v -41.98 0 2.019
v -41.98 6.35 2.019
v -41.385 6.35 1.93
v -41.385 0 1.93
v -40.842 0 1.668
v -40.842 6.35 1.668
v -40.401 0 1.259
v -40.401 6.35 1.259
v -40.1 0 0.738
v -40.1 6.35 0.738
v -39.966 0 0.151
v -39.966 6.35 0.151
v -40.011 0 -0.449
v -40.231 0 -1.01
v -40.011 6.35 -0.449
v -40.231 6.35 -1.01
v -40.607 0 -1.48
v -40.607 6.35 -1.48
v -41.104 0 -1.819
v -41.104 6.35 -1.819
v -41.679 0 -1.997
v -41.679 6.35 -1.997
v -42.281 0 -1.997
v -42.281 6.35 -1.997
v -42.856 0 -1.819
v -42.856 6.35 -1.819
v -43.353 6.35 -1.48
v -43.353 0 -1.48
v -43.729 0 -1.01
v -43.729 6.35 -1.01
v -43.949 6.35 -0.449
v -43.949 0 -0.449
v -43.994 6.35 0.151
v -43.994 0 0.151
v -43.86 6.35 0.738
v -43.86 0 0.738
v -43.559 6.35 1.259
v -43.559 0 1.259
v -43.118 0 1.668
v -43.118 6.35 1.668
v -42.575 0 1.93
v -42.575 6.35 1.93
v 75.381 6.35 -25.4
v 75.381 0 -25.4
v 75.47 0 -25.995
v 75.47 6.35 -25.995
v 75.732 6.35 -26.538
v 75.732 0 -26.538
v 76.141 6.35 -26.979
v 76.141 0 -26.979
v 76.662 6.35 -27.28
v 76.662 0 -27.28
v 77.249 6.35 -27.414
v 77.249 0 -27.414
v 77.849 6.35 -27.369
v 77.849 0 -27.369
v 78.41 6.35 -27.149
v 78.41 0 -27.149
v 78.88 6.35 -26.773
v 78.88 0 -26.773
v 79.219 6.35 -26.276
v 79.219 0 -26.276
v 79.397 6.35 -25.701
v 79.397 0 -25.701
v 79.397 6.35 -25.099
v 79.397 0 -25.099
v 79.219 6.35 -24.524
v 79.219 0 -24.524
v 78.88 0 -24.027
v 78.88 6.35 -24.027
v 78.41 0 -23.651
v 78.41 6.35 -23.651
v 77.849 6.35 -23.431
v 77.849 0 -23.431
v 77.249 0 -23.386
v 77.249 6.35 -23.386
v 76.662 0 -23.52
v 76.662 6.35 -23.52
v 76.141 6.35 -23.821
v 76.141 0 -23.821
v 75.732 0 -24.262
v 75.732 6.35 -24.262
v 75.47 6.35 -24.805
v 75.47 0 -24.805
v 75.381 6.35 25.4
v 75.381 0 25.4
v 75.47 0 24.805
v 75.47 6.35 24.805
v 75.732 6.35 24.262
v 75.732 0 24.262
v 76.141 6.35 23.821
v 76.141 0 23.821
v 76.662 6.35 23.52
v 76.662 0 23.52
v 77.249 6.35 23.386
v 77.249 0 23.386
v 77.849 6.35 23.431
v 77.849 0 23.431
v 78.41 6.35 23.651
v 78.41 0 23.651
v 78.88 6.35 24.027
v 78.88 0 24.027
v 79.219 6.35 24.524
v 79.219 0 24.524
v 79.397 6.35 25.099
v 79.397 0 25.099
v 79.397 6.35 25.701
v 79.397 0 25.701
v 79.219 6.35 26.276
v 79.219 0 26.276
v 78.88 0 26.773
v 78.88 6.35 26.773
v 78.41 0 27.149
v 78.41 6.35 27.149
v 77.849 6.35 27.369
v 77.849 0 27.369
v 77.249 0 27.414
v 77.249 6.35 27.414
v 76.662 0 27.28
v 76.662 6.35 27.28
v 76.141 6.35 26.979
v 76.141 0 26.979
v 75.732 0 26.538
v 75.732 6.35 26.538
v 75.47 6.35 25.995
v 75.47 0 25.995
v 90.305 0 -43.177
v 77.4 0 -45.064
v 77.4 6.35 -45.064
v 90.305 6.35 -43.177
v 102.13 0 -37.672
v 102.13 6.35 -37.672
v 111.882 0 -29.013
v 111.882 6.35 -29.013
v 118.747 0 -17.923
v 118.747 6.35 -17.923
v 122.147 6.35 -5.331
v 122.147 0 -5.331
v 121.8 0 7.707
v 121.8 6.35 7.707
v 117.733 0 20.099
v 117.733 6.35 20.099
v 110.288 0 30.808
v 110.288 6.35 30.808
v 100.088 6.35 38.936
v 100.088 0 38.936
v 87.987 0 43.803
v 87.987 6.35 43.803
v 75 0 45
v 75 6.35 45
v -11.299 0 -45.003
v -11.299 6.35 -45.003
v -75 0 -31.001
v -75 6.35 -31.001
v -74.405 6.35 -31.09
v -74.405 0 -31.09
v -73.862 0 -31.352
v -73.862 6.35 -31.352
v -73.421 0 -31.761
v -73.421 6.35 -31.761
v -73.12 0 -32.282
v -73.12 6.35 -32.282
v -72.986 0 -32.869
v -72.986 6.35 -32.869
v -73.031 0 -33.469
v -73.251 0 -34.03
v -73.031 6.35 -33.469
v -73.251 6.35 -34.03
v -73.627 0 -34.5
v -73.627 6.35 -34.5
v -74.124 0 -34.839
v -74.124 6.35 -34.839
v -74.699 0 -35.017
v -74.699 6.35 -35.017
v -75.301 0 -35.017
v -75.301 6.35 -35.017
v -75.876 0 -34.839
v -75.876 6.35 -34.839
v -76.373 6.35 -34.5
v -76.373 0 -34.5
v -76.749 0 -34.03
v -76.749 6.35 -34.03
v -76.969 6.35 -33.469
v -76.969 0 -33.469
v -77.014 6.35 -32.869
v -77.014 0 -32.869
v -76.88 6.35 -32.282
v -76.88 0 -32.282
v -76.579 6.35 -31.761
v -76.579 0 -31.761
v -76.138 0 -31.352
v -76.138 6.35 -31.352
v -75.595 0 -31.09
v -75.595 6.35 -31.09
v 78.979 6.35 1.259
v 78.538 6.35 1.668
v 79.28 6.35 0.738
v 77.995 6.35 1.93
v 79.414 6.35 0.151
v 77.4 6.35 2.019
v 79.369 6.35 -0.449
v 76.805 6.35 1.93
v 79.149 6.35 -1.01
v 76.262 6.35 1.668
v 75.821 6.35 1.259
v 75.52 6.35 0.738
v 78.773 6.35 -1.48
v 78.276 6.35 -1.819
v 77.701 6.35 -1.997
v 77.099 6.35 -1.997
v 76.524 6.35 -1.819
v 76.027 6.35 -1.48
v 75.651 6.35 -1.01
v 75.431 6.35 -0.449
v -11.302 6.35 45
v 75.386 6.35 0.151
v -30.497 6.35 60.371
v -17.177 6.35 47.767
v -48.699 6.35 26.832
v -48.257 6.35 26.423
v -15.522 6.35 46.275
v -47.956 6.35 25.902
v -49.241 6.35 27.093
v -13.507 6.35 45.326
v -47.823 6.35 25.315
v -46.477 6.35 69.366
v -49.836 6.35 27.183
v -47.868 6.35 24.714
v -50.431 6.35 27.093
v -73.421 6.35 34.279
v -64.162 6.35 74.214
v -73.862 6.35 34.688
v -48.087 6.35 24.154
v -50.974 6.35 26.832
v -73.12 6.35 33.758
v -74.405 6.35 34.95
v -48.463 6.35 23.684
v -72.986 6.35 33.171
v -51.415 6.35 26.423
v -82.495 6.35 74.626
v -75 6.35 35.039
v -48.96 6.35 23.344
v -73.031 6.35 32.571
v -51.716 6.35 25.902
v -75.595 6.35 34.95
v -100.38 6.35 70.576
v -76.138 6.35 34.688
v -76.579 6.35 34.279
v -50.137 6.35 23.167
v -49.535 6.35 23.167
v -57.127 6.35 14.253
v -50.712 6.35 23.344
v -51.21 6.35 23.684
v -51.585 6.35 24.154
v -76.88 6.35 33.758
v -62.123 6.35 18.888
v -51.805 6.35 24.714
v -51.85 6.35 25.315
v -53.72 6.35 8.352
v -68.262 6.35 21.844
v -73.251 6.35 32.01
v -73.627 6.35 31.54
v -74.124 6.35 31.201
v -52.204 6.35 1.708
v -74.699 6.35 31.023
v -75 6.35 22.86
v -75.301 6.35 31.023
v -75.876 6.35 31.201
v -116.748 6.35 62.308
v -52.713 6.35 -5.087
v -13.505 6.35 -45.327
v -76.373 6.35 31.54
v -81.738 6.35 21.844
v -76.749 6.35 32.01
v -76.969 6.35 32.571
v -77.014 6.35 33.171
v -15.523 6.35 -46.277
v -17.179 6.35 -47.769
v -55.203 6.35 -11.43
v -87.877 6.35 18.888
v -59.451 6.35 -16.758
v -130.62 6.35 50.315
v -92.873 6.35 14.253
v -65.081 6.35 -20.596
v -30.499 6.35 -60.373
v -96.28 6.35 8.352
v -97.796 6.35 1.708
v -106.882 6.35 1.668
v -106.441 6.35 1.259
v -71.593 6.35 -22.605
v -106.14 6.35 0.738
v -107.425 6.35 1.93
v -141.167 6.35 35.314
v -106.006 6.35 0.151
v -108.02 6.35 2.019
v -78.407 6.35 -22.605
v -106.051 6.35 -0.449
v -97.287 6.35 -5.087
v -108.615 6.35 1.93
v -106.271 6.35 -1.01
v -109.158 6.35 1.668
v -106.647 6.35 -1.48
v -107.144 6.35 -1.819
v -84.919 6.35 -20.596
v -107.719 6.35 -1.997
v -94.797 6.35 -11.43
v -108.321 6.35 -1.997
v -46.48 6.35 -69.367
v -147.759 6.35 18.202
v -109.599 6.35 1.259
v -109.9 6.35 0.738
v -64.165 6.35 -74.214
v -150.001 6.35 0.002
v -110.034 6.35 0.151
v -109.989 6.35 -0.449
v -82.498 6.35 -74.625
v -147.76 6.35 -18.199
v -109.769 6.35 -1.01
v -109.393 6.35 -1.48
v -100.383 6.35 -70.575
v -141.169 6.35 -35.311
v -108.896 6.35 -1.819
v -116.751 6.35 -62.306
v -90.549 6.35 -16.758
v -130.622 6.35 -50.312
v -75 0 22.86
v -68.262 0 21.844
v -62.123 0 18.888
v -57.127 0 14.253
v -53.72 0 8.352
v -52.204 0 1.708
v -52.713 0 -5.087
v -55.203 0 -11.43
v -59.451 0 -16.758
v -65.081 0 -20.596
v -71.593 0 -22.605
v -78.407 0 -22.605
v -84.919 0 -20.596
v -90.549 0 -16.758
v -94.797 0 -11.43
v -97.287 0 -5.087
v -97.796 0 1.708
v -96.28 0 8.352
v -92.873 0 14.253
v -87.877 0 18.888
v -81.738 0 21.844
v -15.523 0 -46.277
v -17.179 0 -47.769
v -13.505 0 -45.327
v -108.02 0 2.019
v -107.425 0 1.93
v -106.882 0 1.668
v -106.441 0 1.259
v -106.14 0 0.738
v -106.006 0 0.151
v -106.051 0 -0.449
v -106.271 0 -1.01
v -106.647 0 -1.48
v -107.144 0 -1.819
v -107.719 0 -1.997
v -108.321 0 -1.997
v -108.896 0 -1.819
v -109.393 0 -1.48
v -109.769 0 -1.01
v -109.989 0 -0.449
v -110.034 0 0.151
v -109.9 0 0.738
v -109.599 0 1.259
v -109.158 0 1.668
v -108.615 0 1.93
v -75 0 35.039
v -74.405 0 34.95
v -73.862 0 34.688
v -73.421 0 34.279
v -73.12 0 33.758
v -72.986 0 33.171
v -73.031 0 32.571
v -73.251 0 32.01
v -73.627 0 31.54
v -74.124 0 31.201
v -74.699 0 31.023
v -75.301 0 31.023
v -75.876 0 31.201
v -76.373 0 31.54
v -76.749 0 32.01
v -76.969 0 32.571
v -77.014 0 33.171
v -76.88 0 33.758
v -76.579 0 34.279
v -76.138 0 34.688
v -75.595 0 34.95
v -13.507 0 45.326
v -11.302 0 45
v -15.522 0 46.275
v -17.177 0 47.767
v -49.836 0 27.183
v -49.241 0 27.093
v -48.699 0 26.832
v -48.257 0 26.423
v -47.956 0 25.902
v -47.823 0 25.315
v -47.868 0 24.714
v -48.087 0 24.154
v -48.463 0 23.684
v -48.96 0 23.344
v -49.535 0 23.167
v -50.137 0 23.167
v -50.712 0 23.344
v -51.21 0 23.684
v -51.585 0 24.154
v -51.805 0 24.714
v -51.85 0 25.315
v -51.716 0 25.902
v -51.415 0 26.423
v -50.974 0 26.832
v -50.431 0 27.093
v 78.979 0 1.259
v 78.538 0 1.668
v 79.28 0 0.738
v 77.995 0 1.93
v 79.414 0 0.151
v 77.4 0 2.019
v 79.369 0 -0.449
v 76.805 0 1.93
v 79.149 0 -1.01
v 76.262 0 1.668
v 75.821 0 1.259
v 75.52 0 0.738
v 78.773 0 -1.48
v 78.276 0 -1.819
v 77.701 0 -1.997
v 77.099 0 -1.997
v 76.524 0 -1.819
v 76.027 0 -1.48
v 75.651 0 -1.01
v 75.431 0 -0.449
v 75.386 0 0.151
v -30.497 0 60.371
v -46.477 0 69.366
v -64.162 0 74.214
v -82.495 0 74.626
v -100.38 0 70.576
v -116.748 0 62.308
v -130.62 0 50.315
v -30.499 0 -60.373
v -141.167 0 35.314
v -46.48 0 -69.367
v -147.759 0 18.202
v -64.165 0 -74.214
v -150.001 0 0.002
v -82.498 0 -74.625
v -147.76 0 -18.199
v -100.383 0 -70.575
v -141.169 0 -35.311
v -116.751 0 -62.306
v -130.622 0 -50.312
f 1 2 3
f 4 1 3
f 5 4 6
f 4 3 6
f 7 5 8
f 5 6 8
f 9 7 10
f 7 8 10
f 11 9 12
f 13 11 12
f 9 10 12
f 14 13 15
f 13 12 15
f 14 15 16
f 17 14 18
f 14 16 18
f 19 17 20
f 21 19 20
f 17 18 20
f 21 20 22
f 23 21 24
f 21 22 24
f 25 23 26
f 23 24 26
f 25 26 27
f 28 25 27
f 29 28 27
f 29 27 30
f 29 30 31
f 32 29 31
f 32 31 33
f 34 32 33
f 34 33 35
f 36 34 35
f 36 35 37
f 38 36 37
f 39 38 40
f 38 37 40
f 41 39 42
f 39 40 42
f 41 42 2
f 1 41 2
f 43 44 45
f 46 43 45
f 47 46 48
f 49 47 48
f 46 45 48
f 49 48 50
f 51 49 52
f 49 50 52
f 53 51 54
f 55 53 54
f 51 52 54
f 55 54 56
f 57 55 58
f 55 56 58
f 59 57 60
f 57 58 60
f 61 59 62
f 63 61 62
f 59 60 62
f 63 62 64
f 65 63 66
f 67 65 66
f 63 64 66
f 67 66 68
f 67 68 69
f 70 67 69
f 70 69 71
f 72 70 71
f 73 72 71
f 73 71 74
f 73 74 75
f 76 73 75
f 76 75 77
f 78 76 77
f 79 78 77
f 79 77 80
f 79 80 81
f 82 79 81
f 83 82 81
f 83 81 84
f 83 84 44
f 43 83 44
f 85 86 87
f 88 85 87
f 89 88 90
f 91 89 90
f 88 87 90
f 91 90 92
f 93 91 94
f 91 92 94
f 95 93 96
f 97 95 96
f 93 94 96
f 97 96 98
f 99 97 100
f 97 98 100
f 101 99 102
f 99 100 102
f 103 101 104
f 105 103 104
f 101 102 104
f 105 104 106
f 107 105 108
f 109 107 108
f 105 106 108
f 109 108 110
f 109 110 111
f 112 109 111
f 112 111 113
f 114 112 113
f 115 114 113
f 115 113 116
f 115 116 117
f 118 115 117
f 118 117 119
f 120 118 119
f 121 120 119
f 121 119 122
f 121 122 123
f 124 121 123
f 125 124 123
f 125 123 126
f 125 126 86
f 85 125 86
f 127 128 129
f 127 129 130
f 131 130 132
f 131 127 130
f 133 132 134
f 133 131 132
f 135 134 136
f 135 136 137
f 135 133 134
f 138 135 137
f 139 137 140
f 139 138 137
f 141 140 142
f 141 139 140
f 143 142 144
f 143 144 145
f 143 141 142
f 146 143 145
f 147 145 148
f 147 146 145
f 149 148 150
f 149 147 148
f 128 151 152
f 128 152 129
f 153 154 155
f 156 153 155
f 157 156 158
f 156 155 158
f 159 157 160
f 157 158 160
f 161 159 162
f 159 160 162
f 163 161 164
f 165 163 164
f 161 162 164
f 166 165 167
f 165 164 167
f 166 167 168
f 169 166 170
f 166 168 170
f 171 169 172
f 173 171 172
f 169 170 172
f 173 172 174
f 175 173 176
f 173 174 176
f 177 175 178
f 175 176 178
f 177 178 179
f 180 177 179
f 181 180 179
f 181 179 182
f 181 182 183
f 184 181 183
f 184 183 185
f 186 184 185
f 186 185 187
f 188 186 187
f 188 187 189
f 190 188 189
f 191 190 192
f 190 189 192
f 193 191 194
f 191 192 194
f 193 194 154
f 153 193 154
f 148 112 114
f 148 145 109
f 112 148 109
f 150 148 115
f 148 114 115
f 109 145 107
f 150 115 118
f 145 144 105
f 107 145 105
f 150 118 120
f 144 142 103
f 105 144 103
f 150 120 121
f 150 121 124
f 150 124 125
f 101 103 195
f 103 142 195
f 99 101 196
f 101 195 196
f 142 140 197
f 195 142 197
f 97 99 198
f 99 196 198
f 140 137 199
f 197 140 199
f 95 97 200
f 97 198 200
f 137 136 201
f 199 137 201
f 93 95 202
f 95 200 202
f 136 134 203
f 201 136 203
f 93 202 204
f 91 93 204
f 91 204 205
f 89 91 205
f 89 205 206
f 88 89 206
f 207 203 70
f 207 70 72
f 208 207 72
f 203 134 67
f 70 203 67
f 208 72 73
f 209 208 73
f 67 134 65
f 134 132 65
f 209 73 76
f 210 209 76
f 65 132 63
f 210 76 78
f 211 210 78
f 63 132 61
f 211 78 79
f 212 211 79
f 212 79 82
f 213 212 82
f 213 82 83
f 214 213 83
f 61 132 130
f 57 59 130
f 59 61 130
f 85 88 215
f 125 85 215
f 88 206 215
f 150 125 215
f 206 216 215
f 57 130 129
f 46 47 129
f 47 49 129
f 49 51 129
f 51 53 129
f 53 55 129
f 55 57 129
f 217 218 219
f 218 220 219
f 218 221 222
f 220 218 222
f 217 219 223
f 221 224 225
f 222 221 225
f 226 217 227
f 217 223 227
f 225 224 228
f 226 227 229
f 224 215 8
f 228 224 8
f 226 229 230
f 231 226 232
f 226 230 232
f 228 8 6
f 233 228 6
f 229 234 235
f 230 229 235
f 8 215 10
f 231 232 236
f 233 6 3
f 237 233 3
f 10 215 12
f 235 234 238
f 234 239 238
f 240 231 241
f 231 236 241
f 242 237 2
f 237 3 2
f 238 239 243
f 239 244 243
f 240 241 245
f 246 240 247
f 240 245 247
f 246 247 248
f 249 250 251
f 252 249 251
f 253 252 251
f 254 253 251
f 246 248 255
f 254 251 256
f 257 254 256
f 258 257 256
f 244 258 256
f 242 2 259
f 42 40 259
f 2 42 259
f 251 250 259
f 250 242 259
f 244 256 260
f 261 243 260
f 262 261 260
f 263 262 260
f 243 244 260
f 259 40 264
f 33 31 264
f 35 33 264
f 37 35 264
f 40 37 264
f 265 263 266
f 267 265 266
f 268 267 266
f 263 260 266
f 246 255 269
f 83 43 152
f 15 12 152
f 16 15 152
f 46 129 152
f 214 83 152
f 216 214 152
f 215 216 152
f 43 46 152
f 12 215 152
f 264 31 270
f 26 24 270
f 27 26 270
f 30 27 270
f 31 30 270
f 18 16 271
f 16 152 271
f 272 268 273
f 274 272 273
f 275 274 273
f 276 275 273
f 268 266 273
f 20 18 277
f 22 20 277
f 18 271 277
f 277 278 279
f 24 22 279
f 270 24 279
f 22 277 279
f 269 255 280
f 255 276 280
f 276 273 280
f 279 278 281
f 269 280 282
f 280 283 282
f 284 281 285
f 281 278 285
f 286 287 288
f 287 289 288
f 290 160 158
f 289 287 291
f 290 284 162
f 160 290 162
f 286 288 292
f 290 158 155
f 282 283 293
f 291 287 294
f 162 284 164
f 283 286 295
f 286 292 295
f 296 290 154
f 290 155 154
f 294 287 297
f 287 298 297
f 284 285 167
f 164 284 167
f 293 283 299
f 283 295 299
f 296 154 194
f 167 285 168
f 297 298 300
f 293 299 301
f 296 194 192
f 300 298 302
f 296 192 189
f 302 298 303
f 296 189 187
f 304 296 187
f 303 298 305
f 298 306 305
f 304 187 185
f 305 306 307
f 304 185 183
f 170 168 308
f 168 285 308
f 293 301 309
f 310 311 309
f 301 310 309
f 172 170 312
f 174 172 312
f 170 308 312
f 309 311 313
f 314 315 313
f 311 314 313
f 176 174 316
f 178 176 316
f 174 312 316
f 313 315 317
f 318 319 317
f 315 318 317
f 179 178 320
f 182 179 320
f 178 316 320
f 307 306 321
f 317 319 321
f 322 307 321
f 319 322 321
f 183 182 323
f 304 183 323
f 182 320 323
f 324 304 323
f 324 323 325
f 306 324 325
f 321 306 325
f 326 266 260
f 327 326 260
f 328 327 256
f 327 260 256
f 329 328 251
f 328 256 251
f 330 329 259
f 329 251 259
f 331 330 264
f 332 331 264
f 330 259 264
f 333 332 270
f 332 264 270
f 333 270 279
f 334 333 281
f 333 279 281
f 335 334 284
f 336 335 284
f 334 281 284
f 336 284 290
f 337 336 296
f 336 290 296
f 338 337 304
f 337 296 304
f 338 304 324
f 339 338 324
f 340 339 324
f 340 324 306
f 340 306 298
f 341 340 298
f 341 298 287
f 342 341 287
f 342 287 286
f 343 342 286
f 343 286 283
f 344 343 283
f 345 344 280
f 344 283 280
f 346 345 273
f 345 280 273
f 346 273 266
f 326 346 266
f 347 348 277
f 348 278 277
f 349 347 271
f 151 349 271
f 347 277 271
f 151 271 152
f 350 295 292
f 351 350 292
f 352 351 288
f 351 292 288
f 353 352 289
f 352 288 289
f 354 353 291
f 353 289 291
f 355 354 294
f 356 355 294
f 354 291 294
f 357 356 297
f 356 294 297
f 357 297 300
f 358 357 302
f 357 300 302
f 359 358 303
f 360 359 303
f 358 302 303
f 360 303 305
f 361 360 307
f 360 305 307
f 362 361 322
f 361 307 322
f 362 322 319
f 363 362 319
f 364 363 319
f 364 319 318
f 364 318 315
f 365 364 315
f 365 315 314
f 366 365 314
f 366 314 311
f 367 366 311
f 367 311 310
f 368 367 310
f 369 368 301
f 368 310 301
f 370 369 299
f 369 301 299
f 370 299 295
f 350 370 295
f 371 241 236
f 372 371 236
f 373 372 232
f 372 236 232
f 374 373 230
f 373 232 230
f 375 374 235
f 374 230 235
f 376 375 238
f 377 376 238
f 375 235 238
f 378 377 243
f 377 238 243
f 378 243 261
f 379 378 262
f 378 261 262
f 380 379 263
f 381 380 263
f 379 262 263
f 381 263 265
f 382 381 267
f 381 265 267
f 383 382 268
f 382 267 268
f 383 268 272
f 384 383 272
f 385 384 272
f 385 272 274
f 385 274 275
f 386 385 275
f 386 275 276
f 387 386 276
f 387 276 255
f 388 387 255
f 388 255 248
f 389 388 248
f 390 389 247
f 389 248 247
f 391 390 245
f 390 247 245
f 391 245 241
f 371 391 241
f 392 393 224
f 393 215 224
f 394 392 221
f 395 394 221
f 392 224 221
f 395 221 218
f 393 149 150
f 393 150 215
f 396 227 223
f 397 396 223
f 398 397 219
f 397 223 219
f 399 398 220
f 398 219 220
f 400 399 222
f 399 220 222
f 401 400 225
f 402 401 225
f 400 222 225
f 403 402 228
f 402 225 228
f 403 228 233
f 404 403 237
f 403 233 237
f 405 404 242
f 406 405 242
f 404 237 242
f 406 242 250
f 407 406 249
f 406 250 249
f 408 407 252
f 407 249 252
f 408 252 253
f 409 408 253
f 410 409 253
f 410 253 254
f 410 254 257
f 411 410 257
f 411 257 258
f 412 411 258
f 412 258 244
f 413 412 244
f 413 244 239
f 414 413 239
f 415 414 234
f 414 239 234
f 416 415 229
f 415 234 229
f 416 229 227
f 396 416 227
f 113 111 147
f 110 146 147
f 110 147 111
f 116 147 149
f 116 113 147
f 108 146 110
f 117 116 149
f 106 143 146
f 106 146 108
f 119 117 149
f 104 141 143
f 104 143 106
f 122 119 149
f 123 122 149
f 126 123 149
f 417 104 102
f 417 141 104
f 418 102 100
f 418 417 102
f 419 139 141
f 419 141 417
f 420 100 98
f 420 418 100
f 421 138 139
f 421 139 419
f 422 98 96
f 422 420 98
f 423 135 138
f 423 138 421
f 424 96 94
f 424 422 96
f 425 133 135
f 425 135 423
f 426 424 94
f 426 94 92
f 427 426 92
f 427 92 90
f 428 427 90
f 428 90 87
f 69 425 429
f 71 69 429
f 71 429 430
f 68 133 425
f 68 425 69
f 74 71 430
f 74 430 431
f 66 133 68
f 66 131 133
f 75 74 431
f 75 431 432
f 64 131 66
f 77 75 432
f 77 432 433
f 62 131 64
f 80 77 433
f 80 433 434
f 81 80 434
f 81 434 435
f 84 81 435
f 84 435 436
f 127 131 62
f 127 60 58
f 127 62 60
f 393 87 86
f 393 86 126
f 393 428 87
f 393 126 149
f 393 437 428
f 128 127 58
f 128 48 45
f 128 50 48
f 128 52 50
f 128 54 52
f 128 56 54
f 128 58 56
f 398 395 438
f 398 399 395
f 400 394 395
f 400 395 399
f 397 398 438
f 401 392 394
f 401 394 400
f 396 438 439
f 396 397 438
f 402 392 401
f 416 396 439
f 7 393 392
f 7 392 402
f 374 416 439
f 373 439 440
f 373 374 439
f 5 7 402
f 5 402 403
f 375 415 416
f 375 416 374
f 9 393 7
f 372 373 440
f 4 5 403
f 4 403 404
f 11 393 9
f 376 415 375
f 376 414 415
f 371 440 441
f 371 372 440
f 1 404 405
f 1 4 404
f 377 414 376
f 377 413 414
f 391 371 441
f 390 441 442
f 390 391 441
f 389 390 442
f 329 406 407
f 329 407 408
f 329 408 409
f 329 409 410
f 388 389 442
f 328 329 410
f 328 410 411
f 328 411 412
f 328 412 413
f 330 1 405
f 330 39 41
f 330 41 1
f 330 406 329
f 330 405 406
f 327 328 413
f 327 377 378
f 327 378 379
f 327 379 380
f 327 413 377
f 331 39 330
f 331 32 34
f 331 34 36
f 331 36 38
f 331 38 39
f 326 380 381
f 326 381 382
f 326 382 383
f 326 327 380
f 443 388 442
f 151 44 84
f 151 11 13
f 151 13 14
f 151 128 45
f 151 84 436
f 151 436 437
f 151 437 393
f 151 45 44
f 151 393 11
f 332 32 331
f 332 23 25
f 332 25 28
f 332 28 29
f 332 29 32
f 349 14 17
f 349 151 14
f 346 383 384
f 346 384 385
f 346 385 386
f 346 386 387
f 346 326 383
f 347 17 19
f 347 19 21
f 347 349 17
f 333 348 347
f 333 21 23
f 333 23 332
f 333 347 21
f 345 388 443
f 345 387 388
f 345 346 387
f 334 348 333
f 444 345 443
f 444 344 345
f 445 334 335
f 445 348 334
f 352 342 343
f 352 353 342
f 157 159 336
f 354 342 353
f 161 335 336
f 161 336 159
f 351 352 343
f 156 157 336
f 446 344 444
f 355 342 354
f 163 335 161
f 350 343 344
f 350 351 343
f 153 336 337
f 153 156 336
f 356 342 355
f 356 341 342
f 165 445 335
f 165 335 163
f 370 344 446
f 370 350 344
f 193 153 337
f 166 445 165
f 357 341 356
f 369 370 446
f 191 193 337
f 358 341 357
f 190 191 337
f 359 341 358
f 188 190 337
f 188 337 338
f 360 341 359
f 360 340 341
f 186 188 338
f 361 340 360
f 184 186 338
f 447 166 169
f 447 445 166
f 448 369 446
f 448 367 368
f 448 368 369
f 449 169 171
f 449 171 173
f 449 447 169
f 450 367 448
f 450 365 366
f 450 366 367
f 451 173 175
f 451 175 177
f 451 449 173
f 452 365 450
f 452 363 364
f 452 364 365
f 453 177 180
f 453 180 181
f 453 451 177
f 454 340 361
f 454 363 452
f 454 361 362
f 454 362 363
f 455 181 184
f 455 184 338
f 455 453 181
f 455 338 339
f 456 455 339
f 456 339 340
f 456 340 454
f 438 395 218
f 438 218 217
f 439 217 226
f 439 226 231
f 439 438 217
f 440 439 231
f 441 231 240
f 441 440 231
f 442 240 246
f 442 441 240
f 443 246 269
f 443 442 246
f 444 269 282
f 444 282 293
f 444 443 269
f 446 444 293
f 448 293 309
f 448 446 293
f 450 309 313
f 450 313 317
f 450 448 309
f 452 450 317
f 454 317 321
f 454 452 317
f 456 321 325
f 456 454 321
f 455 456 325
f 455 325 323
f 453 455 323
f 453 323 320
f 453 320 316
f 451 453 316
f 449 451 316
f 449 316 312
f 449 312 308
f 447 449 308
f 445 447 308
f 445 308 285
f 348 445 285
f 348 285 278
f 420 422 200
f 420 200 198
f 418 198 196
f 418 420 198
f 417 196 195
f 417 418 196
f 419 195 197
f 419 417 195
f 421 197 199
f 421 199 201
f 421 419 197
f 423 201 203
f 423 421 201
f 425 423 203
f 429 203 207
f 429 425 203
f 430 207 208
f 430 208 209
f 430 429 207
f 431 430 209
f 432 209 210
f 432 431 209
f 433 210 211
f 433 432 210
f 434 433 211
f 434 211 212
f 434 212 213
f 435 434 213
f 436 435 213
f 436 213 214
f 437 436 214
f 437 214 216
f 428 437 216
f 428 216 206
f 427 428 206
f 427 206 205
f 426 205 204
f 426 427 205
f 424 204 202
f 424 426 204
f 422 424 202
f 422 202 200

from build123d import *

# Parameters (mm, degrees)
SKETCH1_R                   = 2.0193
BOSS_EXTRUDE1_DEPTH         = 6.35
SKETCH16_R                  = 22.86
SKETCH16_R_2                = 2.0193
CUT_EXTRUDE1_DEPTH          = 6.35
FILLET1_R                   = 7.62
F_21_0_159_DIAMETER_HOLE1_D = 4.0386


with BuildPart() as part:
    # Sketch1 → Boss-Extrude1 (new body)
    with BuildSketch(Plane(origin=(0, 0, 0), x_dir=(1, 0, 0), z_dir=(0, 1, 0))):
        with BuildLine():
            Line((75, -45), (-14.998600006, -45))
            ThreePointArc((-14.998600006, -45), (-150.00112, 0), (-14.998600006, 45))
            Line((-14.998600006, 45), (77.4, 45.063954554))
            ThreePointArc((77.4, 45.063954554), (122.447963078, -1.200425985), (75, -45))
        make_face()
        with Locations(Location((77.4, 0, 0), (0, 0, 270))):
            Circle(SKETCH1_R, mode=Mode.SUBTRACT)
    extrude(amount=BOSS_EXTRUDE1_DEPTH)

    # Sketch16 → Cut-Extrude1 (cut)
    with BuildSketch(Plane(origin=(0.964771866, 6.35, 105.934324836), x_dir=(-1, 0, 0), z_dir=(0, 1, 0))):
        with Locations(Location((75.964771866, -105.934324836, 0), (0, 0, 90))):
            Circle(SKETCH16_R)
        with Locations(Location((50.800979112, -80.770532082, 0), (0, 0, 90))):
            Circle(SKETCH16_R_2)
        with Locations(Location((42.944771866, -105.934324836, 0), (0, 0, 90))):
            Circle(SKETCH16_R_2)
        with Locations(Location((75.964771866, -72.914324836, 0), (0, 0, 90))):
            Circle(SKETCH16_R_2)
        with Locations(Location((108.984771866, -105.934324836, 0), (0, 0, 90))):
            Circle(SKETCH16_R_2)
        with Locations(Location((75.964771866, -138.954324836, 0), (0, 0, 90))):
            Circle(SKETCH16_R_2)
    extrude(amount=-CUT_EXTRUDE1_DEPTH, mode=Mode.SUBTRACT)

    # Fillet1
    fillet1_edges = [part.edges().sort_by_distance(p)[0] for p in [
        (-14.998600006, 3.175, -45),
        (-14.998600006, 3.175, 45),
    ]]
    fillet(fillet1_edges, radius=FILLET1_R)

    # #21 (0.159) Diameter Hole1 (through all)
    with Locations(Plane(origin=(0, 6.35, 0), x_dir=(1, 0, 0), z_dir=(0, 1, 0))):
        with Locations((77.4, 25.4), (77.4, -25.4)):
            Hole(F_21_0_159_DIAMETER_HOLE1_D / 2)


solid = part.part
